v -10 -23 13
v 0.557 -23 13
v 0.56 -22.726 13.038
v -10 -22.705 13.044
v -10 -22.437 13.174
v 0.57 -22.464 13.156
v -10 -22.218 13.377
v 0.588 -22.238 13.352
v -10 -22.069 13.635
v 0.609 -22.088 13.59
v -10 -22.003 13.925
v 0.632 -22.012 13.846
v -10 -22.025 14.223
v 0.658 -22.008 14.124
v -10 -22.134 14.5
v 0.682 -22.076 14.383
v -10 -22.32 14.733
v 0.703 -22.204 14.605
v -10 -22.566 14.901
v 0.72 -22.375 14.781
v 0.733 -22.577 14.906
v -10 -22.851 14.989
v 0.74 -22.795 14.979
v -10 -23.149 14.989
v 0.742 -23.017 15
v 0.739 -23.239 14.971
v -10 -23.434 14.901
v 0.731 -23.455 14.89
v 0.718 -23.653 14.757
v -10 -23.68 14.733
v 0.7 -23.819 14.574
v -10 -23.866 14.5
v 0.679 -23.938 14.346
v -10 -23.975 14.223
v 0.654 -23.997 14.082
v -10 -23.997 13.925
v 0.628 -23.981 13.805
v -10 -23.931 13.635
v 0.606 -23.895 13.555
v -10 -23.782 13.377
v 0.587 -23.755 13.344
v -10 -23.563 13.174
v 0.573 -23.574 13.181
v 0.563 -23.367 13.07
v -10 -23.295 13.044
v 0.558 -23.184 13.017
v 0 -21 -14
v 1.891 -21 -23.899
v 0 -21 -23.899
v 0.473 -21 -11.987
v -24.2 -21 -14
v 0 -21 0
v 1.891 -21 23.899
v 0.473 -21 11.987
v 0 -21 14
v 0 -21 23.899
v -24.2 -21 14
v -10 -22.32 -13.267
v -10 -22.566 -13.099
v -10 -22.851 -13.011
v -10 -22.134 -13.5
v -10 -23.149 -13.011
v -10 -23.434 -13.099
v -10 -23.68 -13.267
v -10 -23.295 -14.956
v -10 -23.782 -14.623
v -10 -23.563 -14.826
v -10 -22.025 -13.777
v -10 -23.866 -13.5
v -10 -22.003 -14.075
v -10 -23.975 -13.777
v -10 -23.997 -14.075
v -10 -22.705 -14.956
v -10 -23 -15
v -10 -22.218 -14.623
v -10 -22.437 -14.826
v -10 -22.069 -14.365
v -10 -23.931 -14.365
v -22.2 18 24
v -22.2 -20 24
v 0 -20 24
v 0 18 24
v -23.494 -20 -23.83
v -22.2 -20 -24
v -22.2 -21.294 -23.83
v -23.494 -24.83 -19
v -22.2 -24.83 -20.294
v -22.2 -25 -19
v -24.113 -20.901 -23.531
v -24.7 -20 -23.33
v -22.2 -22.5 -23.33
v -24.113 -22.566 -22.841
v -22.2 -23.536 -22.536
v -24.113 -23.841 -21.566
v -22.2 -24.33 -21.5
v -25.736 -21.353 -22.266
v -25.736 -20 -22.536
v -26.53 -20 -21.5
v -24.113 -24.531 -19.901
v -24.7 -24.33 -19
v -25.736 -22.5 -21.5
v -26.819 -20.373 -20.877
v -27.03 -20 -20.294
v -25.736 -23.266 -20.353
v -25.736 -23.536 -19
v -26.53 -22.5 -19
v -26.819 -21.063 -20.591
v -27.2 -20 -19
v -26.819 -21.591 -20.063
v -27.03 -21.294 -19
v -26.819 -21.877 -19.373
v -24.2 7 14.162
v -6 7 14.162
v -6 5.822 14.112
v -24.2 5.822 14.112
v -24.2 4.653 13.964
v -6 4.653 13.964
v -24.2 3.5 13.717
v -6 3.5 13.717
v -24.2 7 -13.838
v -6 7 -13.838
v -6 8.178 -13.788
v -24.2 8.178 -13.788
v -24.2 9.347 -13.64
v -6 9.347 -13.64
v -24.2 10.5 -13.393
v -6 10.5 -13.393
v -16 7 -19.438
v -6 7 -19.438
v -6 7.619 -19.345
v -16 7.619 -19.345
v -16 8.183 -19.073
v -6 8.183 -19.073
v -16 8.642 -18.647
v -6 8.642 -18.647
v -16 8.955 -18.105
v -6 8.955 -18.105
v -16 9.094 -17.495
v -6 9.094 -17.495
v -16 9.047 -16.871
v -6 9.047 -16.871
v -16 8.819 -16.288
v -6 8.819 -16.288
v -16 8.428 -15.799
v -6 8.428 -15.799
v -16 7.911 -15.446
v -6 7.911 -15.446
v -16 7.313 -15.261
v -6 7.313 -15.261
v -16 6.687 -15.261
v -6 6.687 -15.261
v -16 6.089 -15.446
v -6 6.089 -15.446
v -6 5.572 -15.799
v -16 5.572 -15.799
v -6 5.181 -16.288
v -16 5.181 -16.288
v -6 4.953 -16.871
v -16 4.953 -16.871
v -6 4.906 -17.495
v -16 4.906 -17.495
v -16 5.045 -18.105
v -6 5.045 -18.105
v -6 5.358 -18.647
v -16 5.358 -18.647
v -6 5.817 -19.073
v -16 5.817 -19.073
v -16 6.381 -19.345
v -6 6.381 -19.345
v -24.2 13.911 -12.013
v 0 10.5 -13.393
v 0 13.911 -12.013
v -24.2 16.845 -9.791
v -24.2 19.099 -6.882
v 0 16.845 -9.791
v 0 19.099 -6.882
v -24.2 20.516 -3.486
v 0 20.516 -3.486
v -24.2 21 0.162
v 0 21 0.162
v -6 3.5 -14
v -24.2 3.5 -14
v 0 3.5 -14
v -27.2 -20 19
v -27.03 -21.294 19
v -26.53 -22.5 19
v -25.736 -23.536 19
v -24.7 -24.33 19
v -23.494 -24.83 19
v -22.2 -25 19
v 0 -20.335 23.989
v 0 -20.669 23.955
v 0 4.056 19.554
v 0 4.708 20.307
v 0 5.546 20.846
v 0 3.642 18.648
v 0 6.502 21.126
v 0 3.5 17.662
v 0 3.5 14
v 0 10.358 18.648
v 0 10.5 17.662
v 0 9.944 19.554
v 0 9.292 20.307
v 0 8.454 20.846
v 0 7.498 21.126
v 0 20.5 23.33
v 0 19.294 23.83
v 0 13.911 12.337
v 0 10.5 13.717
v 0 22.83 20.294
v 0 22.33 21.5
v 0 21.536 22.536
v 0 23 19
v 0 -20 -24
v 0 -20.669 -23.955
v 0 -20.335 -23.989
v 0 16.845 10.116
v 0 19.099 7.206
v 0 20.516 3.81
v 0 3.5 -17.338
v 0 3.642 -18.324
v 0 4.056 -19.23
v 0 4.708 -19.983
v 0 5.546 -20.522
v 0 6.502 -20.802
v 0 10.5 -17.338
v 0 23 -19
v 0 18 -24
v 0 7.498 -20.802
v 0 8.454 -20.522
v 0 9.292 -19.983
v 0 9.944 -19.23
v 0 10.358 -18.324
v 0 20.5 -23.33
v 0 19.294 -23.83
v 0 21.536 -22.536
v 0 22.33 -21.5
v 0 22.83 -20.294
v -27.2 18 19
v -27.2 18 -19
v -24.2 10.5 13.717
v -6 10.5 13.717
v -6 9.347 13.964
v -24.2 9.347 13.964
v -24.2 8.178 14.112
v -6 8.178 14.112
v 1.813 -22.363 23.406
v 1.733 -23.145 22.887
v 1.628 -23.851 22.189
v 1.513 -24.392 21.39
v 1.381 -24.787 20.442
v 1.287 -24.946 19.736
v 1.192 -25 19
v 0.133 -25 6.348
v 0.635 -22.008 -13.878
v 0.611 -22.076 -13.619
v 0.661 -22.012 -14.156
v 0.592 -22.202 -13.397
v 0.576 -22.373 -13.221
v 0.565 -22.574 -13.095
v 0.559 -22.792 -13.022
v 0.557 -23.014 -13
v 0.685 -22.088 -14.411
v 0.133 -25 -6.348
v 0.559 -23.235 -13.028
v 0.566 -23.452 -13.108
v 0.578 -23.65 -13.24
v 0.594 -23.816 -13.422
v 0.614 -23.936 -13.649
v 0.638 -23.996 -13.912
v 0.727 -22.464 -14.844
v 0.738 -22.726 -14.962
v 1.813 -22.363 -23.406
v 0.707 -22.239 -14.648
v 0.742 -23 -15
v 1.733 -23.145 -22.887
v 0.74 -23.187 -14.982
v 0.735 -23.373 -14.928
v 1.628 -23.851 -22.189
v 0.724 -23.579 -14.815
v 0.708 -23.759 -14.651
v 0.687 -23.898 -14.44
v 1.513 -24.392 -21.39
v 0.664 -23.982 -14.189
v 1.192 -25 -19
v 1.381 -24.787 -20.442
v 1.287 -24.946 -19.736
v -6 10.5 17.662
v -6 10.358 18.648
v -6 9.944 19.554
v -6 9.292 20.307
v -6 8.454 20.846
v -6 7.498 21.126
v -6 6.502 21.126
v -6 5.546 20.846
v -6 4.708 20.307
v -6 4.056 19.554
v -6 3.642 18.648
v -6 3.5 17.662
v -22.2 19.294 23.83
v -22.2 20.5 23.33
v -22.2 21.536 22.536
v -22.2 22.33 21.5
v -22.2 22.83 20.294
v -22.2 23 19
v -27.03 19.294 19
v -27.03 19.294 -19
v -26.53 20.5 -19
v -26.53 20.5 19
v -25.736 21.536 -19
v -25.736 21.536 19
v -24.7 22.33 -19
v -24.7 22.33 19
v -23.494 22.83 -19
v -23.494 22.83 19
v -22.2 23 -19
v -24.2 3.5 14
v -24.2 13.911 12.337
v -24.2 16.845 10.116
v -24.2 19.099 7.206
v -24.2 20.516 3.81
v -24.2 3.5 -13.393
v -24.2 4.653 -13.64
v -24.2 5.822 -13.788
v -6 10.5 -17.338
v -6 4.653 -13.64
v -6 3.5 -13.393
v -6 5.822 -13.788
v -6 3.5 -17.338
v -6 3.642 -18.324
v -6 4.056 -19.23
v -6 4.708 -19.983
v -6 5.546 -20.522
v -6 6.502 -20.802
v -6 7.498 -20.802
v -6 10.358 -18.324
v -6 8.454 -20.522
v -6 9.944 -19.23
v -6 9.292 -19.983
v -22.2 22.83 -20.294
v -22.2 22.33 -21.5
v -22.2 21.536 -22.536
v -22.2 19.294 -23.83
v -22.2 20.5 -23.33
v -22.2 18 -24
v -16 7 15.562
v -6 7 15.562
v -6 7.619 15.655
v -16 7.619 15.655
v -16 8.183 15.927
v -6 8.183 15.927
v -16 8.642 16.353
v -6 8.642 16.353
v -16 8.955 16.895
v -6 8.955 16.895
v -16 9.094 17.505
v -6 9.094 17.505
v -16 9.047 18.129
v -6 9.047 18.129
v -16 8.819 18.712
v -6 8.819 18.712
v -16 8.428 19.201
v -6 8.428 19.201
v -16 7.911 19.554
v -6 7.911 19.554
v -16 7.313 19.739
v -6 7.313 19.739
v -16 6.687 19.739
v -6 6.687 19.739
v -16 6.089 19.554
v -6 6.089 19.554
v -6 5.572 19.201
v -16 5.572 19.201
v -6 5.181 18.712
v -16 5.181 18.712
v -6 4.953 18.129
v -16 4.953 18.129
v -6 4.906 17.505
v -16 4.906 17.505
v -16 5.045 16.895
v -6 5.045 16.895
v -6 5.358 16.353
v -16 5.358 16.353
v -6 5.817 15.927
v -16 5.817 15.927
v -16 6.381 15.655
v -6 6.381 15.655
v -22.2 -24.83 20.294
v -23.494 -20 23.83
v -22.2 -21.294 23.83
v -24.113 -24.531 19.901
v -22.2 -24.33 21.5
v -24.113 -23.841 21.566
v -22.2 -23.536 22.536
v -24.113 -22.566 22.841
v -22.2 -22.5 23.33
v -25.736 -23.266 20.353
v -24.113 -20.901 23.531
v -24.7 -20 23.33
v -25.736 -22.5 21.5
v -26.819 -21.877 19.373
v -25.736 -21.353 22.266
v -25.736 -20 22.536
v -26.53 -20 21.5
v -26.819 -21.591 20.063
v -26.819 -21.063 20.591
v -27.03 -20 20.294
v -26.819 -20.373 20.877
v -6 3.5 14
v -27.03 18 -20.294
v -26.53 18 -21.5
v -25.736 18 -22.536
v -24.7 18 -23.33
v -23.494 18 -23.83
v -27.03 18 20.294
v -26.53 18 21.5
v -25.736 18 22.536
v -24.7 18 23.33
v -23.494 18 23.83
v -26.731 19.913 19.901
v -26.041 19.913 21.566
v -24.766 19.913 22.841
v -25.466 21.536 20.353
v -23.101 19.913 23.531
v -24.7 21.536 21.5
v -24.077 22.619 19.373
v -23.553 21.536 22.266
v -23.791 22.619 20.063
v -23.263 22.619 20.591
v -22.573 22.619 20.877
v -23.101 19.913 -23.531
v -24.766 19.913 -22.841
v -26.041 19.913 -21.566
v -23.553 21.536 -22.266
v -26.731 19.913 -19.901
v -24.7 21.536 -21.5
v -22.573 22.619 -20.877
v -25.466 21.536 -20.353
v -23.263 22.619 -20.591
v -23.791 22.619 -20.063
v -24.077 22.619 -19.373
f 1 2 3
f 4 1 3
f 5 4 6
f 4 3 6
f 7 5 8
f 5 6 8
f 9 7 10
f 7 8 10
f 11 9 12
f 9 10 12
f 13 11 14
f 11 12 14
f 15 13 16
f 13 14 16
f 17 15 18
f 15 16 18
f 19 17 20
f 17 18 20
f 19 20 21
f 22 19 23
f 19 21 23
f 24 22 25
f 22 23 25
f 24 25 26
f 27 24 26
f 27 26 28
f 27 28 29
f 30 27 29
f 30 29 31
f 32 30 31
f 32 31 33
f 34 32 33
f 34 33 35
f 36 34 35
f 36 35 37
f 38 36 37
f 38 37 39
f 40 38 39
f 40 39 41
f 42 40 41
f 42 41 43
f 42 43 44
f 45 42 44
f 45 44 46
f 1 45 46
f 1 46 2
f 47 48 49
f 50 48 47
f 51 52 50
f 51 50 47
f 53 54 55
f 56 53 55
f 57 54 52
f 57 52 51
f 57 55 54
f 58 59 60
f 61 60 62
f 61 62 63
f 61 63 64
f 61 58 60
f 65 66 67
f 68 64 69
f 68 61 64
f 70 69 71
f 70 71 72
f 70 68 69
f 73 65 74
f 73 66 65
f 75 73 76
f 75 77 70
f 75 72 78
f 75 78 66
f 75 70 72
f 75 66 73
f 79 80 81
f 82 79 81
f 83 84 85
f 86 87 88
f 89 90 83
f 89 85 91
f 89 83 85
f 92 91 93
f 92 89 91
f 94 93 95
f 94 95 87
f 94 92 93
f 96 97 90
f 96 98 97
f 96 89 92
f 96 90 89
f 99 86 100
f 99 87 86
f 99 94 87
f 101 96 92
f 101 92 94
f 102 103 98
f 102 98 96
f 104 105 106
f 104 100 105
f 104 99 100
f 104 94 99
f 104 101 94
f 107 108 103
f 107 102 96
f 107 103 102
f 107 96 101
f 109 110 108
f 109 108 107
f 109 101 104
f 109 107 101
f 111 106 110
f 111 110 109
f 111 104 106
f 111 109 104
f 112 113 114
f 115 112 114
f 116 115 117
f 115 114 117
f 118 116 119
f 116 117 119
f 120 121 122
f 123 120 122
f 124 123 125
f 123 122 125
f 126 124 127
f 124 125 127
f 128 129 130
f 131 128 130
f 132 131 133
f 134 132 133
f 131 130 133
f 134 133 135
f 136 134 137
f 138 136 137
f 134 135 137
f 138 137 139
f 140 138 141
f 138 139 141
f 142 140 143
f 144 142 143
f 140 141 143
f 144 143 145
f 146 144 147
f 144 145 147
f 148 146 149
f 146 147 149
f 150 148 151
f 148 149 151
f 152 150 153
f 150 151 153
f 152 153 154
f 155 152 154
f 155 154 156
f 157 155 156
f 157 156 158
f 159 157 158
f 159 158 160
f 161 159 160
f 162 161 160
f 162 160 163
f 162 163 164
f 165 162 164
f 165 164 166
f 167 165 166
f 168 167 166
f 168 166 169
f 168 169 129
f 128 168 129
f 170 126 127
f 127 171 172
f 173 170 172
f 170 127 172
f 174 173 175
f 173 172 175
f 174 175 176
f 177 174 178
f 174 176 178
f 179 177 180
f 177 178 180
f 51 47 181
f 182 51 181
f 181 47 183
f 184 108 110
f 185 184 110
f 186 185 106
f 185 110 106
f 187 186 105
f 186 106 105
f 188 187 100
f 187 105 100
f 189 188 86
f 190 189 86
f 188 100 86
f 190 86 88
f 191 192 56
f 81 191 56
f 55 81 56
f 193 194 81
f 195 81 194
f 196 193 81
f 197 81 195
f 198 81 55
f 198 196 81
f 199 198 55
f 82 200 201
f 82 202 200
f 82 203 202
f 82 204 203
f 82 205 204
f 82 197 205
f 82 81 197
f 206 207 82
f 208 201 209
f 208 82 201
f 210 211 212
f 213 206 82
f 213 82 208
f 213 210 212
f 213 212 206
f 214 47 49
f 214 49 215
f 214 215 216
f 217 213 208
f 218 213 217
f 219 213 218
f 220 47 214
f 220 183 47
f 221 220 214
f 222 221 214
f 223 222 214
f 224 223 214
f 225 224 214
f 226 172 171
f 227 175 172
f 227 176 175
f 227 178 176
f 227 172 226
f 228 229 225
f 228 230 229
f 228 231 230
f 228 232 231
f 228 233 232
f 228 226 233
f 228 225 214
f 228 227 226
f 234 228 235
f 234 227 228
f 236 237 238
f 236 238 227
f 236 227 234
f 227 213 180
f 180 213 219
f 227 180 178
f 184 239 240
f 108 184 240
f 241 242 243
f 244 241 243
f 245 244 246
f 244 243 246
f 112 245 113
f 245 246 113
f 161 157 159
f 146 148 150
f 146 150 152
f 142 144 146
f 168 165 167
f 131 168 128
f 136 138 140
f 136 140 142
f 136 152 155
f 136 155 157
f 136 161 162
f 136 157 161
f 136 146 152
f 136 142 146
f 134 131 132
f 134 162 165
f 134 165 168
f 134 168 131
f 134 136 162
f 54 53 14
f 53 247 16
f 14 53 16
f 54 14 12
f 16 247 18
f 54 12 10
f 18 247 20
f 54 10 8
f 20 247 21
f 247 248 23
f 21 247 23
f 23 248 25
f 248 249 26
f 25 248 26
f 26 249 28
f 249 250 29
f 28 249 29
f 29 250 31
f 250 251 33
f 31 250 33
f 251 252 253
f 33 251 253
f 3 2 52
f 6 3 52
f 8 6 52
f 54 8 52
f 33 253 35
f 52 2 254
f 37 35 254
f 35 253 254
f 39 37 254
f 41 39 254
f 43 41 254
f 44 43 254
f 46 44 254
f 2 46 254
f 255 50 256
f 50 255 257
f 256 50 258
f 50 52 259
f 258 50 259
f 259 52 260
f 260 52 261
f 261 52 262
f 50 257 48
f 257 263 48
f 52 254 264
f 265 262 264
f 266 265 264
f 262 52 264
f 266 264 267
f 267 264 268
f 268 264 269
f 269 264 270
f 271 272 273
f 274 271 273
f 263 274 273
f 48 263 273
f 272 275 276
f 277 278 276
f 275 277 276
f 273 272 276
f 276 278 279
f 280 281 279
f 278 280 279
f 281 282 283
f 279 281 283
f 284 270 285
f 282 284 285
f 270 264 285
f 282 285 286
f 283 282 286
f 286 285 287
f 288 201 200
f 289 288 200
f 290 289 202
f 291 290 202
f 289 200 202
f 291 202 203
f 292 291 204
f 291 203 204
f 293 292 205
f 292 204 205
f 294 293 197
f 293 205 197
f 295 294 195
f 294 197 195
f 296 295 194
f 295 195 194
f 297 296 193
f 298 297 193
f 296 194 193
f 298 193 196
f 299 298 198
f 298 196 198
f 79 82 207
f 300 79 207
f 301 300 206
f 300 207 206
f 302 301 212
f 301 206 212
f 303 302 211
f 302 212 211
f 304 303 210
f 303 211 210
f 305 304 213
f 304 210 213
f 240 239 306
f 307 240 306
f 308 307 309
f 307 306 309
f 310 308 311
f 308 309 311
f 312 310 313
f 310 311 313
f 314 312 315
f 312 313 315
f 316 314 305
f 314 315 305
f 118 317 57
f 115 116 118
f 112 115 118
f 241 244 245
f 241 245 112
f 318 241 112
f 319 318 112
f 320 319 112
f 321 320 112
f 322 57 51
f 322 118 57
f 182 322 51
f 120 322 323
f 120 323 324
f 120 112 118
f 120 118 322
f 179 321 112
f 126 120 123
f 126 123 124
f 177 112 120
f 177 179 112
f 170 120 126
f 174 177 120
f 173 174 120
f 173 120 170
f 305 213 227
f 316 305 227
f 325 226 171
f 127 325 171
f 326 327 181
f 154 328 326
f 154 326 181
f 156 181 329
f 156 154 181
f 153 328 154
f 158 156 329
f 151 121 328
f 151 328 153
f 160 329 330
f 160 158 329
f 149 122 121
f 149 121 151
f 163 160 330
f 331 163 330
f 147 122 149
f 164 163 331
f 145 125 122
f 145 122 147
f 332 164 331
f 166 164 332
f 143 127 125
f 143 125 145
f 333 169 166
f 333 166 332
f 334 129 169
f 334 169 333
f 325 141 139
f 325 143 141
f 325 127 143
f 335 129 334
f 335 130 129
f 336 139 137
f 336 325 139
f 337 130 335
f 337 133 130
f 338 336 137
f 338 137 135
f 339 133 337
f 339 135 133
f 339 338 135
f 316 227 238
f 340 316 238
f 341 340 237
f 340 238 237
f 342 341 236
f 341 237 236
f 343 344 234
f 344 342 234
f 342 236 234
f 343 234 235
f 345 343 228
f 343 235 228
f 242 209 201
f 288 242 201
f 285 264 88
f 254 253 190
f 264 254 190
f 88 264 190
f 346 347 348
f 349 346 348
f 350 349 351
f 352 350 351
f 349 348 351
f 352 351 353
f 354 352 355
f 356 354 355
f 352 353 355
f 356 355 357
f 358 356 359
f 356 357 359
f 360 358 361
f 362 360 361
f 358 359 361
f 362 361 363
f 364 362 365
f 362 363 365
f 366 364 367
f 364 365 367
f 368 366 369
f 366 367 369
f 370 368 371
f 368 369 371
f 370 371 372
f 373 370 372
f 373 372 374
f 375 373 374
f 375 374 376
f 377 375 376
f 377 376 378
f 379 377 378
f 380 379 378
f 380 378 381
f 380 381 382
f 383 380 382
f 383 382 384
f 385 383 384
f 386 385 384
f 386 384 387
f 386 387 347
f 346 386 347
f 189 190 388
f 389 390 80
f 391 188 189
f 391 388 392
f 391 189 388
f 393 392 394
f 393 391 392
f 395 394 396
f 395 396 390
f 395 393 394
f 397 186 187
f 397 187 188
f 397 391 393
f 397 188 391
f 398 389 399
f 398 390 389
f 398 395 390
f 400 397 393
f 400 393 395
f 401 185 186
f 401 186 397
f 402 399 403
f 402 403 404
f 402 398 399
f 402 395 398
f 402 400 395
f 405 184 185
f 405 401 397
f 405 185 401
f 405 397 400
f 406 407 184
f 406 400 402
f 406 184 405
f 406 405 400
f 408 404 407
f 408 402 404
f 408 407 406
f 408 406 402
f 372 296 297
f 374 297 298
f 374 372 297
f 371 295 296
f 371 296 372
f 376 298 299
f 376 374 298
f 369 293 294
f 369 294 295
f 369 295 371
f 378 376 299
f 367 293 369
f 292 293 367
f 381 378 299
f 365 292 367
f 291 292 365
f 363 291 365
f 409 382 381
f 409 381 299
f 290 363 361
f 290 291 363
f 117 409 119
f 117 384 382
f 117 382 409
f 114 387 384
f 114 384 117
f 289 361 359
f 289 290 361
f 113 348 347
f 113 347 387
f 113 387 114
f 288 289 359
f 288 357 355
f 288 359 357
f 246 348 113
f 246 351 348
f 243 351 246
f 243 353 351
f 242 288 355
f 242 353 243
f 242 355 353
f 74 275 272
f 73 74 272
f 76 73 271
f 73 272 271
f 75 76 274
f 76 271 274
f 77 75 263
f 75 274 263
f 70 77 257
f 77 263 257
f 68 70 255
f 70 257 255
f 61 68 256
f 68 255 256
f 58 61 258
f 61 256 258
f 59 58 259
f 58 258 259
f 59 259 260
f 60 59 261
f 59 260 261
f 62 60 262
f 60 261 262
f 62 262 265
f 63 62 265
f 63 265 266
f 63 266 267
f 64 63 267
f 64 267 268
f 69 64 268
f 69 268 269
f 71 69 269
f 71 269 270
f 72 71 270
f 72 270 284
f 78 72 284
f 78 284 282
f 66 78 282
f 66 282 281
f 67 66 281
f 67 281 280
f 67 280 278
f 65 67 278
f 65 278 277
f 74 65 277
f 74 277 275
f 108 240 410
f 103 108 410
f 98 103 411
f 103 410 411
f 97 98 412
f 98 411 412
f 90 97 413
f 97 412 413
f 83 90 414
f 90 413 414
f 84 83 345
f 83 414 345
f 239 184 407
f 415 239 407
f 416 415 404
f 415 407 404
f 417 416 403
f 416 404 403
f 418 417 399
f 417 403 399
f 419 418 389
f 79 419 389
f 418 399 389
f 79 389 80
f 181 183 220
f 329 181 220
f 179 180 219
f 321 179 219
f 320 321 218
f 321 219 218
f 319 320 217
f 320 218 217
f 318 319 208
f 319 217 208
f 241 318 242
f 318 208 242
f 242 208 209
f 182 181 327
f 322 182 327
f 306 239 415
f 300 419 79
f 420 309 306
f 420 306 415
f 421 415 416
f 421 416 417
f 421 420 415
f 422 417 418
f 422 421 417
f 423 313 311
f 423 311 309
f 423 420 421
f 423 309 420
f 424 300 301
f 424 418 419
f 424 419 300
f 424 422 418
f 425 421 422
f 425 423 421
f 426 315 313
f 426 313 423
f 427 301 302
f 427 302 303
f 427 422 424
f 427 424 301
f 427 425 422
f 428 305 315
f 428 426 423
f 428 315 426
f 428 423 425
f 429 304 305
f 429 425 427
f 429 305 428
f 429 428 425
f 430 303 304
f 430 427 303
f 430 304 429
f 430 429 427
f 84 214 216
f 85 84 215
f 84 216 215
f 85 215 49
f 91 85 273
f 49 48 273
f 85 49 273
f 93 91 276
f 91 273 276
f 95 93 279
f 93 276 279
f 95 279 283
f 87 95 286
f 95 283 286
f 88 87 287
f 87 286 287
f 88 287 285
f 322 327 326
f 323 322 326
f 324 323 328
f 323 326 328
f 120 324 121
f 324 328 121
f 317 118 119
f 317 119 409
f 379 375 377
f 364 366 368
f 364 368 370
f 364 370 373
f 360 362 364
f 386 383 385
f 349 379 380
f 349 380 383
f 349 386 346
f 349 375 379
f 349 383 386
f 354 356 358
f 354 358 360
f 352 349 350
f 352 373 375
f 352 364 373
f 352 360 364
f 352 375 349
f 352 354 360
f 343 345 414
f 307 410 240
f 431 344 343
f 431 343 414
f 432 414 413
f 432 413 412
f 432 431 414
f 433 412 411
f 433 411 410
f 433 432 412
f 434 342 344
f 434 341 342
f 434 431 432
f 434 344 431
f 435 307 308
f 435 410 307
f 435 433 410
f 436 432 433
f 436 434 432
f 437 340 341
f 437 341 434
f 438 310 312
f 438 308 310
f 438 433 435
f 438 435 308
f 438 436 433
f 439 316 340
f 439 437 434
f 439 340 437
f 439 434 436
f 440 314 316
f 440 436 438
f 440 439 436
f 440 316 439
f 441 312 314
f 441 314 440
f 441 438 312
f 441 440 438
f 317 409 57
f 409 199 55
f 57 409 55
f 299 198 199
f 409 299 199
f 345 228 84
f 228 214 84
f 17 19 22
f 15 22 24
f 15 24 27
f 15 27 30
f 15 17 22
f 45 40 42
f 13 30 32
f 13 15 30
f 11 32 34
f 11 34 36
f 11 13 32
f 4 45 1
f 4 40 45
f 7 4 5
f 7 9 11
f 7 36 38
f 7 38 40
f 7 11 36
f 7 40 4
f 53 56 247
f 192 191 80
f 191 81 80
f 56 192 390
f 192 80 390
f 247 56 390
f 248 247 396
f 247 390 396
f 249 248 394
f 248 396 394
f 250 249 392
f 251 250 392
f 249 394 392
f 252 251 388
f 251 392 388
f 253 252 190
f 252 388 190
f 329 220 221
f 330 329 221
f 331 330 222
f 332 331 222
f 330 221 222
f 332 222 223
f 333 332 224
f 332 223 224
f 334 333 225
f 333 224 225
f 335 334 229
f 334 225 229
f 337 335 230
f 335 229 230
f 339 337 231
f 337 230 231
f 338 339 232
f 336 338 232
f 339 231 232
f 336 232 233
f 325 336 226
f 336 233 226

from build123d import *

# Parameters (mm, degrees)
ESQUISSE1_W             = 48
ESQUISSE1_H             = 48
BOSS_EXTRU_1_DEPTH      = 27.2
ESQUISSE1_5_R           = 3.120993446
ENL_V_MAT_EXTRU_1_DEPTH = 24.2
ESQUISSE1_6_R           = 2.1
ENL_V_MAT_EXTRU_2_DEPTH = 6
ESQUISSE1_8_R           = 2.1
ENL_V_MAT_EXTRU_3_DEPTH = 16
BOSS_EXTRU_3_DEPTH      = 4
ESQUISSE1_9_R           = 1
ENL_V_MAT_EXTRU_4_DEPTH = 10
ENL_V_START             = 10
ESQUISSE1_10_R          = 1
ENL_V_MAT_EXTRU_5_DEPTH = 10
CONG_1_R                = 5


with BuildPart() as part:
    # Esquisse1 → Boss.-Extru.1 (new body)
    with BuildSketch(Plane(origin=(0, 0, 0), x_dir=(0, 0, -1), z_dir=(1, 0, 0))):
        with Locations((0, -1)):
            Rectangle(ESQUISSE1_W, ESQUISSE1_H)
    extrude(amount=-BOSS_EXTRU_1_DEPTH)

    # Esquisse1<5> → Enlèv. mat.-Extru.1 (cut)
    # profile 1 of 4: a face of its own
    with BuildSketch(Plane(origin=(0, 0, 0), x_dir=(0, 0, -1), z_dir=(1, 0, 0))):
        with BuildLine():
            ThreePointArc((-14.162038672, 7), (-14.05045442, 5.235939905), (-13.717480384, 3.5))
            ThreePointArc((-13.717480384, 3.5), (-0.162038672, -7), (13.39340304, 3.5))
            ThreePointArc((13.39340304, 3.5), (13.726377076, 5.235939905), (13.837961328, 7))
            Line((13.837961328, 7), (-14.162038672, 7))
        make_face()
    # profile 2 of 4: a face of its own
    with BuildSketch(Plane(origin=(0, 0, 0), x_dir=(0, 0, -1), z_dir=(1, 0, 0))):
        with BuildLine():
            ThreePointArc((13.39340304, 10.5), (8.411175453, 18.067971791), (-0.162038609, 21))
            ThreePointArc((-0.162038609, 21), (-8.735252747, 18.06797183), (-13.717480384, 10.5))
            ThreePointArc((-13.717480384, 10.5), (-14.05045442, 8.764060095), (-14.162038672, 7))
            Line((-14.162038672, 7), (13.837961328, 7))
            ThreePointArc((13.837961328, 7), (13.726377076, 8.764060095), (13.39340304, 10.5))
        make_face()
        with Locations((0, 15)):
            Circle(ESQUISSE1_5_R, mode=Mode.SUBTRACT)
    # profile 3 of 4: a face of its own
    with BuildSketch(Plane(origin=(0, 0, 0), x_dir=(0, 0, -1), z_dir=(1, 0, 0))):
        with BuildLine():
            Line((-14, 3.5), (-14, -21))
            Line((-14, -21), (14, -21))
            Line((14, -21), (14, 3.5))
            Line((14, 3.5), (13.39340304, 3.5))
            ThreePointArc((13.39340304, 3.5), (-0.162038672, -7), (-13.717480384, 3.5))
            Line((-13.717480384, 3.5), (-14, 3.5))
        make_face()
    # profile 4 of 4: a face of its own
    with BuildSketch(Plane(origin=(0, 0, 0), x_dir=(0, 0, -1), z_dir=(1, 0, 0))):
        with Locations((0, 15)):
            Circle(ESQUISSE1_5_R)
    extrude(amount=-ENL_V_MAT_EXTRU_1_DEPTH, mode=Mode.SUBTRACT)

    # Esquisse1<6> → Enlèv. mat.-Extru.2 (cut)
    # profile 1 of 4: a face of its own
    with BuildSketch(Plane(origin=(0, 0, 0), x_dir=(0, 0, -1), z_dir=(1, 0, 0))):
        with BuildLine():
            Line((-17.662038672, 3.5), (-14, 3.5))
            Line((-14, 3.5), (-13.717480384, 3.5))
            ThreePointArc((-13.717480384, 3.5), (-14.05045442, 5.235939905), (-14.162038672, 7))
            ThreePointArc((-14.162038672, 7), (-14.05045442, 8.764060095), (-13.717480384, 10.5))
            Line((-13.717480384, 10.5), (-17.662038672, 10.5))
            ThreePointArc((-17.662038672, 10.5), (-21.162038672, 7), (-17.662038672, 3.5))
        make_face()
        with Locations((-17.662038672, 7)):
            Circle(ESQUISSE1_6_R, mode=Mode.SUBTRACT)
    # profile 2 of 4: a face of its own
    with BuildSketch(Plane(origin=(0, 0, 0), x_dir=(0, 0, -1), z_dir=(1, 0, 0))):
        with Locations((-17.662038672, 7)):
            Circle(ESQUISSE1_6_R)
    # profile 3 of 4: a face of its own
    with BuildSketch(Plane(origin=(0, 0, 0), x_dir=(0, 0, -1), z_dir=(1, 0, 0))):
        with BuildLine():
            Line((13.39340304, 3.5), (14, 3.5))
            Line((14, 3.5), (17.337961328, 3.5))
            ThreePointArc((17.337961328, 3.5), (20.837961328, 7), (17.337961328, 10.5))
            Line((17.337961328, 10.5), (13.39340304, 10.5))
            ThreePointArc((13.39340304, 10.5), (13.726377076, 8.764060095), (13.837961328, 7))
            ThreePointArc((13.837961328, 7), (13.726377076, 5.235939905), (13.39340304, 3.5))
        make_face()
        with Locations((17.337961328, 7)):
            Circle(ESQUISSE1_6_R, mode=Mode.SUBTRACT)
    # profile 4 of 4: a face of its own
    with BuildSketch(Plane(origin=(0, 0, 0), x_dir=(0, 0, -1), z_dir=(1, 0, 0))):
        with Locations((17.337961328, 7)):
            Circle(ESQUISSE1_6_R)
    extrude(amount=-ENL_V_MAT_EXTRU_2_DEPTH, mode=Mode.SUBTRACT)

    # Esquisse1<8> → Enlèv. mat.-Extru.3 (cut)
    with BuildSketch(Plane(origin=(0, 0, 0), x_dir=(0, 0, -1), z_dir=(1, 0, 0))):
        with Locations((-17.662038672, 7)):
            Circle(ESQUISSE1_8_R)
        with Locations((17.337961328, 7)):
            Circle(ESQUISSE1_8_R)
    extrude(amount=-ENL_V_MAT_EXTRU_3_DEPTH, mode=Mode.SUBTRACT)

    # Esquisse2 → Boss.-Extru.3 (add)
    with BuildSketch(Plane.XZ.offset(25)):
        with BuildLine():
            Line((0, 24), (1.906695686, 24))
            ThreePointArc((1.906695686, 24), (0, 0), (1.906695686, -24))
            Line((1.906695686, -24), (0, -24))
            Line((0, -24), (-1.50393066, -24))
            Line((-1.50393066, -24), (-1.50393066, 24))
            Line((-1.50393066, 24), (0, 24))
        make_face()
    extrude(amount=-BOSS_EXTRU_3_DEPTH)

    # Esquisse1<9> → Enlèv. mat.-Extru.4 (cut)
    with BuildSketch(Plane(origin=(0, 0, 0), x_dir=(0, 0, -1), z_dir=(1, 0, 0))):
        with Locations((-14, -23)):
            Circle(ESQUISSE1_9_R)
        with Locations((14, -23)):
            Circle(ESQUISSE1_9_R)
    extrude(amount=-ENL_V_MAT_EXTRU_4_DEPTH, mode=Mode.SUBTRACT)

    # Esquisse1<10> → Enlèv. mat.-Extru.5 (cut)
    with BuildSketch(Plane(origin=(0, 0, 0), x_dir=(0, 0, -1), z_dir=(1, 0, 0)).offset(ENL_V_START)):
        with Locations((-14, -23)):
            Circle(ESQUISSE1_10_R)
        with Locations((14, -23)):
            Circle(ESQUISSE1_10_R)
    extrude(amount=-ENL_V_MAT_EXTRU_5_DEPTH, mode=Mode.SUBTRACT)

    # Congé1
    # the kernel refuses this fillet: 5 mm, written as the material it takes off along each edge
    with BuildSketch(Plane(origin=(-22.2, -20, 19), x_dir=(0, -1, 0), z_dir=(-1, 0, 0))) as cong_1_piece_1_section:
        Polygon((0, 0), (CONG_1_R, 0), (CONG_1_R, CONG_1_R), (0, CONG_1_R), align=None)
    cong_1_piece_1 = extrude(amount=CONG_1_R, mode=Mode.PRIVATE)
    cong_1_piece_1 = cong_1_piece_1 - Plane(origin=(-22.2, -20, 19), x_dir=(0, 0.7071067811865477, -0.7071067811865475), z_dir=(-1, 0, 0)) * Sphere(CONG_1_R, mode=Mode.PRIVATE)
    add(cong_1_piece_1, mode=Mode.SUBTRACT)
    with BuildSketch(Plane(origin=(-22.2, -20, -19), x_dir=(0, -1, 0), z_dir=(-1, 0, 0))) as cong_1_piece_2_section:
        Polygon((0, 0), (CONG_1_R, 0), (CONG_1_R, -CONG_1_R), (0, -CONG_1_R), align=None)
    cong_1_piece_2 = extrude(amount=CONG_1_R, mode=Mode.PRIVATE)
    cong_1_piece_2 = cong_1_piece_2 - Plane(origin=(-22.2, -20, -19), x_dir=(0, 0.7071067811865475, 0.7071067811865476), z_dir=(-1, 0, 0)) * Sphere(CONG_1_R, mode=Mode.PRIVATE)
    add(cong_1_piece_2, mode=Mode.SUBTRACT)
    with BuildSketch(Plane(origin=(-22.2, 18, -19), x_dir=(-1, 0, 0), z_dir=(0, 1, 0))) as cong_1_piece_3_section:
        Polygon((0, 0), (CONG_1_R, 0), (CONG_1_R, -CONG_1_R), (0, -CONG_1_R), align=None)
    cong_1_piece_3 = extrude(amount=CONG_1_R, mode=Mode.PRIVATE)
    cong_1_piece_3 = cong_1_piece_3 - Plane(origin=(-22.2, 18, -19), x_dir=(0.7071067811865475, 0, 0.7071067811865475), z_dir=(0, 1, 0)) * Sphere(CONG_1_R, mode=Mode.PRIVATE)
    add(cong_1_piece_3, mode=Mode.SUBTRACT)
    with BuildSketch(Plane(origin=(-22.2, 18, 19), x_dir=(-1, 0, 0), z_dir=(0, 1, 0))) as cong_1_piece_4_section:
        Polygon((0, 0), (CONG_1_R, 0), (CONG_1_R, CONG_1_R), (0, CONG_1_R), align=None)
    cong_1_piece_4 = extrude(amount=CONG_1_R, mode=Mode.PRIVATE)
    cong_1_piece_4 = cong_1_piece_4 - Plane(origin=(-22.2, 18, 19), x_dir=(0.7071067811865475, 0, -0.7071067811865475), z_dir=(0, 1, 0)) * Sphere(CONG_1_R, mode=Mode.PRIVATE)
    add(cong_1_piece_4, mode=Mode.SUBTRACT)
    with BuildSketch(Plane(origin=(-22.2, -25, 24), x_dir=(0, 0, -1), z_dir=(1, 0, 0)), Plane(origin=(14.406695686, -25, -24), x_dir=(0, 0, 1), z_dir=(-1, 0, 0))) as cong_1_piece_5:
        with BuildLine():
            CenterArc((CONG_1_R, CONG_1_R), CONG_1_R, 180, 90)
            Line((0, CONG_1_R), (0, 0))
            Line((0, 0), (CONG_1_R, 0))
        make_face()
    extrude(amount=36.606695686, mode=Mode.SUBTRACT)
    with BuildSketch(Plane(origin=(-27.2, -25, -19), x_dir=(0, 1, 0), z_dir=(0, 0, 1)), Plane(origin=(-27.2, 18, -24), x_dir=(0, 0, 1), z_dir=(0, -1, 0)), Plane(origin=(-27.2, -20, 24), x_dir=(0, 0, -1), z_dir=(0, 1, 0))) as cong_1_piece_6:
        with BuildLine():
            CenterArc((CONG_1_R, -CONG_1_R), CONG_1_R, 90, 90)
            Line((0, -CONG_1_R), (0, 0))
            Line((0, 0), (CONG_1_R, 0))
        make_face()
    extrude(amount=38, mode=Mode.SUBTRACT)
    with BuildSketch(Plane(origin=(12.5, 23, -24), x_dir=(0, 0, 1), z_dir=(-1, 0, 0))) as cong_1_piece_7:
        with BuildLine():
            CenterArc((CONG_1_R, -CONG_1_R), CONG_1_R, 90, 90)
            Line((0, -CONG_1_R), (0, 0))
            Line((0, 0), (CONG_1_R, 0))
        make_face()
    extrude(amount=34.7, mode=Mode.SUBTRACT)
    with BuildSketch(Plane(origin=(-27.2, 23, 19), x_dir=(1, 0, 0), z_dir=(0, 0, -1))) as cong_1_piece_8:
        with BuildLine():
            CenterArc((CONG_1_R, CONG_1_R), CONG_1_R, 180, 90)
            Line((0, CONG_1_R), (0, 0))
            Line((0, 0), (CONG_1_R, 0))
        make_face()
    extrude(amount=38, mode=Mode.SUBTRACT)
    with BuildSketch(Plane(origin=(12.5, 23, 24), x_dir=(0, 0, -1), z_dir=(-1, 0, 0))) as cong_1_piece_9:
        with BuildLine():
            CenterArc((CONG_1_R, CONG_1_R), CONG_1_R, 180, 90)
            Line((0, CONG_1_R), (0, 0))
            Line((0, 0), (CONG_1_R, 0))
        make_face()
    extrude(amount=34.7, mode=Mode.SUBTRACT)


solid = part.part
